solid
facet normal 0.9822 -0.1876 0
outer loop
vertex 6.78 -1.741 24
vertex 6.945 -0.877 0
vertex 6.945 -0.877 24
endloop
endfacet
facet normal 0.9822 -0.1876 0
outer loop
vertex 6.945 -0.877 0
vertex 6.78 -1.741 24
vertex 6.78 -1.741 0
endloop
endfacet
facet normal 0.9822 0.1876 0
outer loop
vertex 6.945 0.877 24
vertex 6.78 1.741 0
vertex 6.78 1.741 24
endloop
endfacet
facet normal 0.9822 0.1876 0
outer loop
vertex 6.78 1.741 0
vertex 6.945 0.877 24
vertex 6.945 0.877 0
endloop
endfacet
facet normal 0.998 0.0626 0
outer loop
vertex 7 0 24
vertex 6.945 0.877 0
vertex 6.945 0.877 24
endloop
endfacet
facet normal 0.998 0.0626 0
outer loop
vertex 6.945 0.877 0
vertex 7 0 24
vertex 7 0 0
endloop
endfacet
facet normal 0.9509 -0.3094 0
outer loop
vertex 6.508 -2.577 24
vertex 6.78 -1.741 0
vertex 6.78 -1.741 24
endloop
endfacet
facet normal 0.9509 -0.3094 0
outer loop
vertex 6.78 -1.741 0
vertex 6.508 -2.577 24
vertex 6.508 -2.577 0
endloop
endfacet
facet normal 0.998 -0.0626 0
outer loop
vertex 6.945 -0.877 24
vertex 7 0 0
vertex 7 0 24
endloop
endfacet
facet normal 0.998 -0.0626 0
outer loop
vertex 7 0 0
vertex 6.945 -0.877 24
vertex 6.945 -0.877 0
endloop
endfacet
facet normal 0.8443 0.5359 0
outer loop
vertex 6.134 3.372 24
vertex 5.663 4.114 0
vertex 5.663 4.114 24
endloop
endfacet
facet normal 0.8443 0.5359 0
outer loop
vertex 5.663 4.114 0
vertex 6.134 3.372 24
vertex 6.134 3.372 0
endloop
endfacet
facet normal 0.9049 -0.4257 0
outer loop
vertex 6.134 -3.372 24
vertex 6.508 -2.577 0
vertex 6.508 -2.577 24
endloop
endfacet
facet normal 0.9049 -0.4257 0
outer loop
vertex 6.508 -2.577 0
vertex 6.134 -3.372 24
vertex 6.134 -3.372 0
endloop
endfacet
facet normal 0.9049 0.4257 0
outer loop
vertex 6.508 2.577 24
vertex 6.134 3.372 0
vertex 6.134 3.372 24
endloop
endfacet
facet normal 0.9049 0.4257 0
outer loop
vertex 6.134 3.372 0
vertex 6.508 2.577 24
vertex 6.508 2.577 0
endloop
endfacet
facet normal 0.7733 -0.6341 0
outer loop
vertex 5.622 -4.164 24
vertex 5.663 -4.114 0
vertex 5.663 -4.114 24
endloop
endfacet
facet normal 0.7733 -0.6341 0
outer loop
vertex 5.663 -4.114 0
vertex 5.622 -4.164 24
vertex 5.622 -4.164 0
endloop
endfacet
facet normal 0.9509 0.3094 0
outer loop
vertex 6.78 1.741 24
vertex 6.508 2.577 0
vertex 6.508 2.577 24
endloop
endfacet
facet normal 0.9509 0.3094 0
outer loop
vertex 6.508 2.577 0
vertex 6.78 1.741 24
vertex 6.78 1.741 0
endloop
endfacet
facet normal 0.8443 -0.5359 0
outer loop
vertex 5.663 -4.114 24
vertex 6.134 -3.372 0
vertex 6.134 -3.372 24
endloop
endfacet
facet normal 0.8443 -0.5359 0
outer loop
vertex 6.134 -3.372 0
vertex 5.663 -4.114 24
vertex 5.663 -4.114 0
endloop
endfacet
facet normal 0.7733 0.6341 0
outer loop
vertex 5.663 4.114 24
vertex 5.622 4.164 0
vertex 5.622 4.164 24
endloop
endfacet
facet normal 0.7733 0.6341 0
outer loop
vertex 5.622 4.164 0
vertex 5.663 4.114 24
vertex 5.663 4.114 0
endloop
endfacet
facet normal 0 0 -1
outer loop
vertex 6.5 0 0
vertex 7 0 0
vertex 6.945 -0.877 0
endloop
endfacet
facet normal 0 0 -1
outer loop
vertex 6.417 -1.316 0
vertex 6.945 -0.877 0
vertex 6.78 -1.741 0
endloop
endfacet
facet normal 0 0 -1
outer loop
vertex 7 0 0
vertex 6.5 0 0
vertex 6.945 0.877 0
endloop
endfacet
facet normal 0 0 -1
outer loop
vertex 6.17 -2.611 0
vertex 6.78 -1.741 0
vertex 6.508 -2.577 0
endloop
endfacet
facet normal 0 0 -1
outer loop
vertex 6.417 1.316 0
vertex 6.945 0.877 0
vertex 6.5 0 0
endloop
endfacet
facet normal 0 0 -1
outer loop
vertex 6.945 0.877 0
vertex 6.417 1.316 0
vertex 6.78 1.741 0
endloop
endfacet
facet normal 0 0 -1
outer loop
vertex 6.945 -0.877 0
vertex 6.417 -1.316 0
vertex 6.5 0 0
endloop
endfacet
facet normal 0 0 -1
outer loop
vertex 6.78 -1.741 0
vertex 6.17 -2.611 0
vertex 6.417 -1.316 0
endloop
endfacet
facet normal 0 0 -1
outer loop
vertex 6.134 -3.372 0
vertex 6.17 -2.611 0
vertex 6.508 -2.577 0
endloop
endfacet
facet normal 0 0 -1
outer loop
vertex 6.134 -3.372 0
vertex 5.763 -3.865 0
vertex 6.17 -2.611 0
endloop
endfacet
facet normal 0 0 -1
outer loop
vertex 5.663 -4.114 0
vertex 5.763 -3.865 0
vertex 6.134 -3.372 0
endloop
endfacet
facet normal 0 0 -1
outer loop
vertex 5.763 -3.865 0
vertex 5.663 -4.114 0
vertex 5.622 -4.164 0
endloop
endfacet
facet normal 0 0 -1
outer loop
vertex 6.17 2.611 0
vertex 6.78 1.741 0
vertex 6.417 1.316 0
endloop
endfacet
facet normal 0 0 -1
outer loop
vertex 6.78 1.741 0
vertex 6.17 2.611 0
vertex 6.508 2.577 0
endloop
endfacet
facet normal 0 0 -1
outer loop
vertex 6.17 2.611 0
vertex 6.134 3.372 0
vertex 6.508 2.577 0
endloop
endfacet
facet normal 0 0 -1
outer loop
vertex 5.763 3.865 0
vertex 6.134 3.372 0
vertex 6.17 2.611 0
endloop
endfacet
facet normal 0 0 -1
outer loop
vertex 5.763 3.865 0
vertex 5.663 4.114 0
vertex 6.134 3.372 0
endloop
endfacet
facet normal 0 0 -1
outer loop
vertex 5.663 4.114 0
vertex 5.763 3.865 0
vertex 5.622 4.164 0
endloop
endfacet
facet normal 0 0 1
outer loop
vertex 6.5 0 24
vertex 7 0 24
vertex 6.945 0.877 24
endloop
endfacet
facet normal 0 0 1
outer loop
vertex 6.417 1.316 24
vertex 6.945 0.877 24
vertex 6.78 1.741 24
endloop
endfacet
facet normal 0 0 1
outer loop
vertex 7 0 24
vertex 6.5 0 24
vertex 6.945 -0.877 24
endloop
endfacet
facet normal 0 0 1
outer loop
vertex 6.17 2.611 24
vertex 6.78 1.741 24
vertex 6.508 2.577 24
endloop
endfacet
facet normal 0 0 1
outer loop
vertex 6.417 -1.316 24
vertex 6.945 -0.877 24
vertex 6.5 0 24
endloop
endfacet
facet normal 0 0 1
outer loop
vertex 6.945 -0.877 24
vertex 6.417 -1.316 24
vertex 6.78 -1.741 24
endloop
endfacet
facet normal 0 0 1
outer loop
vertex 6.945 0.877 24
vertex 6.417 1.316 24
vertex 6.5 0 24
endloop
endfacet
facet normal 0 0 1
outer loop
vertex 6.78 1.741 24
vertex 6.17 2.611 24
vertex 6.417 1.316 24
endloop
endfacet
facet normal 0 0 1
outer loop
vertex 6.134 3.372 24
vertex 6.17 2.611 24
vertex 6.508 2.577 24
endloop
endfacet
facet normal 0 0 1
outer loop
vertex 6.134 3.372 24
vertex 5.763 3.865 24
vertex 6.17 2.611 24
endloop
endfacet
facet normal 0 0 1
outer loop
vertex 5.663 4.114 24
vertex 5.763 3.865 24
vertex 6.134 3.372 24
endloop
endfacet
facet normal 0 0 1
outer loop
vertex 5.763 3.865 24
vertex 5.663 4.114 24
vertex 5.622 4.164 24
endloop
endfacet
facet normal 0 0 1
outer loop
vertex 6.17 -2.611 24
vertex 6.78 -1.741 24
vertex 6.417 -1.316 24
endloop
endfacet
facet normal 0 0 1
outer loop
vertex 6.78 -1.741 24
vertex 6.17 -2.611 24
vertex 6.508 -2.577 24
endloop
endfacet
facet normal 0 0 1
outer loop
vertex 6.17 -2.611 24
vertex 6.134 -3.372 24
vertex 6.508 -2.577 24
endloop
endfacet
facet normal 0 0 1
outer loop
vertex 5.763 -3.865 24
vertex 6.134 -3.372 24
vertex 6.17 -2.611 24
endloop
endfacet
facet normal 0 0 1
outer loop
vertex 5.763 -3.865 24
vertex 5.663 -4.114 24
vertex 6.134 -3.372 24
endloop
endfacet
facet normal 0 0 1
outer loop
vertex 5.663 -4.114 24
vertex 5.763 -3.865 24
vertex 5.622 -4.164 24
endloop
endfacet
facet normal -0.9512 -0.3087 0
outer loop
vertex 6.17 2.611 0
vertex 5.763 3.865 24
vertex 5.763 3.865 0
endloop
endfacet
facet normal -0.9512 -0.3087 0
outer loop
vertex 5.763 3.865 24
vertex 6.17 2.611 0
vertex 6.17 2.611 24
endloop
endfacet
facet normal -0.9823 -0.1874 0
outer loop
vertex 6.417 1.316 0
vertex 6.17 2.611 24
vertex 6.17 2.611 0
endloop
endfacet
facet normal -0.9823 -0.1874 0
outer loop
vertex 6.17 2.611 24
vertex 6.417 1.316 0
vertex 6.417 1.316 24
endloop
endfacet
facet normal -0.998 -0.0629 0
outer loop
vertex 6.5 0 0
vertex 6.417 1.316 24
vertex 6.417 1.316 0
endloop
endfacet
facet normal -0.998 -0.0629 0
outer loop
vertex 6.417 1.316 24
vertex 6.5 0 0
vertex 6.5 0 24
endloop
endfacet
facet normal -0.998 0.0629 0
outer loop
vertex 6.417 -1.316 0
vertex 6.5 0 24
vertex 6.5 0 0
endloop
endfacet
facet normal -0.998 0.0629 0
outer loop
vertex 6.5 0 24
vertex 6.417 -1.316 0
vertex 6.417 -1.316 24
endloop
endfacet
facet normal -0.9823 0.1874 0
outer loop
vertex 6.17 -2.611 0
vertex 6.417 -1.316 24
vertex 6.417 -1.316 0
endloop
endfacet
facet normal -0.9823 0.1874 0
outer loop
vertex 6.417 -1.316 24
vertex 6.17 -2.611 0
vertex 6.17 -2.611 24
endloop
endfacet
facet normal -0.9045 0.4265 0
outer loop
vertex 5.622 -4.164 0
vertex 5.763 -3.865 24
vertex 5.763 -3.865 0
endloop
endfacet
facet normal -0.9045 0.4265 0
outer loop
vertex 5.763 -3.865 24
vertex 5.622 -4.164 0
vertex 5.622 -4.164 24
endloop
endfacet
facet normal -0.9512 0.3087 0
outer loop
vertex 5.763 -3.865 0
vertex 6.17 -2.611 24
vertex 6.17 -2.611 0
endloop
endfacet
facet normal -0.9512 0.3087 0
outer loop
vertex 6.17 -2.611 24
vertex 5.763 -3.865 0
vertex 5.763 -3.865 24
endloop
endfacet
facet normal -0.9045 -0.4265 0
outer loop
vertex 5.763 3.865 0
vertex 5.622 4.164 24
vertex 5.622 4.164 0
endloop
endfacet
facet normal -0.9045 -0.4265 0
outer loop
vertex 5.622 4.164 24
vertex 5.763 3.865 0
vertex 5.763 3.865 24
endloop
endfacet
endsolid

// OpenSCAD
$fn = 50;


difference() {
	union() {
		cylinder(h = 24, r = 7.0000000000);
		translate(v = [-7.0000000000, 0, 0]) {
			cylinder(h = 24, r = 7.0000000000);
		}
	}
	union() {
		cylinder(h = 24, r = 3.2500000000);
		cylinder(h = 24, r = 1.8000000000);
		cylinder(h = 24, r = 1.8000000000);
		cylinder(h = 24, r = 1.8000000000);
		translate(v = [-11.5000000000, 0, 0]) {
			hull() {
				translate(v = [-3.7500000000, 0.0000000000, 0]) {
					cylinder(h = 24, r = 10.5000000000);
				}
				translate(v = [3.7500000000, 0.0000000000, 0]) {
					cylinder(h = 24, r = 10.5000000000);
				}
				translate(v = [-3.7500000000, -0.0000000000, 0]) {
					cylinder(h = 24, r = 10.5000000000);
				}
				translate(v = [3.7500000000, -0.0000000000, 0]) {
					cylinder(h = 24, r = 10.5000000000);
				}
			}
		}
		translate(v = [-4.0000000000, 0, 0.0000000000]) {
			cylinder(h = 24, r = 10.5000000000);
		}
	}
}
